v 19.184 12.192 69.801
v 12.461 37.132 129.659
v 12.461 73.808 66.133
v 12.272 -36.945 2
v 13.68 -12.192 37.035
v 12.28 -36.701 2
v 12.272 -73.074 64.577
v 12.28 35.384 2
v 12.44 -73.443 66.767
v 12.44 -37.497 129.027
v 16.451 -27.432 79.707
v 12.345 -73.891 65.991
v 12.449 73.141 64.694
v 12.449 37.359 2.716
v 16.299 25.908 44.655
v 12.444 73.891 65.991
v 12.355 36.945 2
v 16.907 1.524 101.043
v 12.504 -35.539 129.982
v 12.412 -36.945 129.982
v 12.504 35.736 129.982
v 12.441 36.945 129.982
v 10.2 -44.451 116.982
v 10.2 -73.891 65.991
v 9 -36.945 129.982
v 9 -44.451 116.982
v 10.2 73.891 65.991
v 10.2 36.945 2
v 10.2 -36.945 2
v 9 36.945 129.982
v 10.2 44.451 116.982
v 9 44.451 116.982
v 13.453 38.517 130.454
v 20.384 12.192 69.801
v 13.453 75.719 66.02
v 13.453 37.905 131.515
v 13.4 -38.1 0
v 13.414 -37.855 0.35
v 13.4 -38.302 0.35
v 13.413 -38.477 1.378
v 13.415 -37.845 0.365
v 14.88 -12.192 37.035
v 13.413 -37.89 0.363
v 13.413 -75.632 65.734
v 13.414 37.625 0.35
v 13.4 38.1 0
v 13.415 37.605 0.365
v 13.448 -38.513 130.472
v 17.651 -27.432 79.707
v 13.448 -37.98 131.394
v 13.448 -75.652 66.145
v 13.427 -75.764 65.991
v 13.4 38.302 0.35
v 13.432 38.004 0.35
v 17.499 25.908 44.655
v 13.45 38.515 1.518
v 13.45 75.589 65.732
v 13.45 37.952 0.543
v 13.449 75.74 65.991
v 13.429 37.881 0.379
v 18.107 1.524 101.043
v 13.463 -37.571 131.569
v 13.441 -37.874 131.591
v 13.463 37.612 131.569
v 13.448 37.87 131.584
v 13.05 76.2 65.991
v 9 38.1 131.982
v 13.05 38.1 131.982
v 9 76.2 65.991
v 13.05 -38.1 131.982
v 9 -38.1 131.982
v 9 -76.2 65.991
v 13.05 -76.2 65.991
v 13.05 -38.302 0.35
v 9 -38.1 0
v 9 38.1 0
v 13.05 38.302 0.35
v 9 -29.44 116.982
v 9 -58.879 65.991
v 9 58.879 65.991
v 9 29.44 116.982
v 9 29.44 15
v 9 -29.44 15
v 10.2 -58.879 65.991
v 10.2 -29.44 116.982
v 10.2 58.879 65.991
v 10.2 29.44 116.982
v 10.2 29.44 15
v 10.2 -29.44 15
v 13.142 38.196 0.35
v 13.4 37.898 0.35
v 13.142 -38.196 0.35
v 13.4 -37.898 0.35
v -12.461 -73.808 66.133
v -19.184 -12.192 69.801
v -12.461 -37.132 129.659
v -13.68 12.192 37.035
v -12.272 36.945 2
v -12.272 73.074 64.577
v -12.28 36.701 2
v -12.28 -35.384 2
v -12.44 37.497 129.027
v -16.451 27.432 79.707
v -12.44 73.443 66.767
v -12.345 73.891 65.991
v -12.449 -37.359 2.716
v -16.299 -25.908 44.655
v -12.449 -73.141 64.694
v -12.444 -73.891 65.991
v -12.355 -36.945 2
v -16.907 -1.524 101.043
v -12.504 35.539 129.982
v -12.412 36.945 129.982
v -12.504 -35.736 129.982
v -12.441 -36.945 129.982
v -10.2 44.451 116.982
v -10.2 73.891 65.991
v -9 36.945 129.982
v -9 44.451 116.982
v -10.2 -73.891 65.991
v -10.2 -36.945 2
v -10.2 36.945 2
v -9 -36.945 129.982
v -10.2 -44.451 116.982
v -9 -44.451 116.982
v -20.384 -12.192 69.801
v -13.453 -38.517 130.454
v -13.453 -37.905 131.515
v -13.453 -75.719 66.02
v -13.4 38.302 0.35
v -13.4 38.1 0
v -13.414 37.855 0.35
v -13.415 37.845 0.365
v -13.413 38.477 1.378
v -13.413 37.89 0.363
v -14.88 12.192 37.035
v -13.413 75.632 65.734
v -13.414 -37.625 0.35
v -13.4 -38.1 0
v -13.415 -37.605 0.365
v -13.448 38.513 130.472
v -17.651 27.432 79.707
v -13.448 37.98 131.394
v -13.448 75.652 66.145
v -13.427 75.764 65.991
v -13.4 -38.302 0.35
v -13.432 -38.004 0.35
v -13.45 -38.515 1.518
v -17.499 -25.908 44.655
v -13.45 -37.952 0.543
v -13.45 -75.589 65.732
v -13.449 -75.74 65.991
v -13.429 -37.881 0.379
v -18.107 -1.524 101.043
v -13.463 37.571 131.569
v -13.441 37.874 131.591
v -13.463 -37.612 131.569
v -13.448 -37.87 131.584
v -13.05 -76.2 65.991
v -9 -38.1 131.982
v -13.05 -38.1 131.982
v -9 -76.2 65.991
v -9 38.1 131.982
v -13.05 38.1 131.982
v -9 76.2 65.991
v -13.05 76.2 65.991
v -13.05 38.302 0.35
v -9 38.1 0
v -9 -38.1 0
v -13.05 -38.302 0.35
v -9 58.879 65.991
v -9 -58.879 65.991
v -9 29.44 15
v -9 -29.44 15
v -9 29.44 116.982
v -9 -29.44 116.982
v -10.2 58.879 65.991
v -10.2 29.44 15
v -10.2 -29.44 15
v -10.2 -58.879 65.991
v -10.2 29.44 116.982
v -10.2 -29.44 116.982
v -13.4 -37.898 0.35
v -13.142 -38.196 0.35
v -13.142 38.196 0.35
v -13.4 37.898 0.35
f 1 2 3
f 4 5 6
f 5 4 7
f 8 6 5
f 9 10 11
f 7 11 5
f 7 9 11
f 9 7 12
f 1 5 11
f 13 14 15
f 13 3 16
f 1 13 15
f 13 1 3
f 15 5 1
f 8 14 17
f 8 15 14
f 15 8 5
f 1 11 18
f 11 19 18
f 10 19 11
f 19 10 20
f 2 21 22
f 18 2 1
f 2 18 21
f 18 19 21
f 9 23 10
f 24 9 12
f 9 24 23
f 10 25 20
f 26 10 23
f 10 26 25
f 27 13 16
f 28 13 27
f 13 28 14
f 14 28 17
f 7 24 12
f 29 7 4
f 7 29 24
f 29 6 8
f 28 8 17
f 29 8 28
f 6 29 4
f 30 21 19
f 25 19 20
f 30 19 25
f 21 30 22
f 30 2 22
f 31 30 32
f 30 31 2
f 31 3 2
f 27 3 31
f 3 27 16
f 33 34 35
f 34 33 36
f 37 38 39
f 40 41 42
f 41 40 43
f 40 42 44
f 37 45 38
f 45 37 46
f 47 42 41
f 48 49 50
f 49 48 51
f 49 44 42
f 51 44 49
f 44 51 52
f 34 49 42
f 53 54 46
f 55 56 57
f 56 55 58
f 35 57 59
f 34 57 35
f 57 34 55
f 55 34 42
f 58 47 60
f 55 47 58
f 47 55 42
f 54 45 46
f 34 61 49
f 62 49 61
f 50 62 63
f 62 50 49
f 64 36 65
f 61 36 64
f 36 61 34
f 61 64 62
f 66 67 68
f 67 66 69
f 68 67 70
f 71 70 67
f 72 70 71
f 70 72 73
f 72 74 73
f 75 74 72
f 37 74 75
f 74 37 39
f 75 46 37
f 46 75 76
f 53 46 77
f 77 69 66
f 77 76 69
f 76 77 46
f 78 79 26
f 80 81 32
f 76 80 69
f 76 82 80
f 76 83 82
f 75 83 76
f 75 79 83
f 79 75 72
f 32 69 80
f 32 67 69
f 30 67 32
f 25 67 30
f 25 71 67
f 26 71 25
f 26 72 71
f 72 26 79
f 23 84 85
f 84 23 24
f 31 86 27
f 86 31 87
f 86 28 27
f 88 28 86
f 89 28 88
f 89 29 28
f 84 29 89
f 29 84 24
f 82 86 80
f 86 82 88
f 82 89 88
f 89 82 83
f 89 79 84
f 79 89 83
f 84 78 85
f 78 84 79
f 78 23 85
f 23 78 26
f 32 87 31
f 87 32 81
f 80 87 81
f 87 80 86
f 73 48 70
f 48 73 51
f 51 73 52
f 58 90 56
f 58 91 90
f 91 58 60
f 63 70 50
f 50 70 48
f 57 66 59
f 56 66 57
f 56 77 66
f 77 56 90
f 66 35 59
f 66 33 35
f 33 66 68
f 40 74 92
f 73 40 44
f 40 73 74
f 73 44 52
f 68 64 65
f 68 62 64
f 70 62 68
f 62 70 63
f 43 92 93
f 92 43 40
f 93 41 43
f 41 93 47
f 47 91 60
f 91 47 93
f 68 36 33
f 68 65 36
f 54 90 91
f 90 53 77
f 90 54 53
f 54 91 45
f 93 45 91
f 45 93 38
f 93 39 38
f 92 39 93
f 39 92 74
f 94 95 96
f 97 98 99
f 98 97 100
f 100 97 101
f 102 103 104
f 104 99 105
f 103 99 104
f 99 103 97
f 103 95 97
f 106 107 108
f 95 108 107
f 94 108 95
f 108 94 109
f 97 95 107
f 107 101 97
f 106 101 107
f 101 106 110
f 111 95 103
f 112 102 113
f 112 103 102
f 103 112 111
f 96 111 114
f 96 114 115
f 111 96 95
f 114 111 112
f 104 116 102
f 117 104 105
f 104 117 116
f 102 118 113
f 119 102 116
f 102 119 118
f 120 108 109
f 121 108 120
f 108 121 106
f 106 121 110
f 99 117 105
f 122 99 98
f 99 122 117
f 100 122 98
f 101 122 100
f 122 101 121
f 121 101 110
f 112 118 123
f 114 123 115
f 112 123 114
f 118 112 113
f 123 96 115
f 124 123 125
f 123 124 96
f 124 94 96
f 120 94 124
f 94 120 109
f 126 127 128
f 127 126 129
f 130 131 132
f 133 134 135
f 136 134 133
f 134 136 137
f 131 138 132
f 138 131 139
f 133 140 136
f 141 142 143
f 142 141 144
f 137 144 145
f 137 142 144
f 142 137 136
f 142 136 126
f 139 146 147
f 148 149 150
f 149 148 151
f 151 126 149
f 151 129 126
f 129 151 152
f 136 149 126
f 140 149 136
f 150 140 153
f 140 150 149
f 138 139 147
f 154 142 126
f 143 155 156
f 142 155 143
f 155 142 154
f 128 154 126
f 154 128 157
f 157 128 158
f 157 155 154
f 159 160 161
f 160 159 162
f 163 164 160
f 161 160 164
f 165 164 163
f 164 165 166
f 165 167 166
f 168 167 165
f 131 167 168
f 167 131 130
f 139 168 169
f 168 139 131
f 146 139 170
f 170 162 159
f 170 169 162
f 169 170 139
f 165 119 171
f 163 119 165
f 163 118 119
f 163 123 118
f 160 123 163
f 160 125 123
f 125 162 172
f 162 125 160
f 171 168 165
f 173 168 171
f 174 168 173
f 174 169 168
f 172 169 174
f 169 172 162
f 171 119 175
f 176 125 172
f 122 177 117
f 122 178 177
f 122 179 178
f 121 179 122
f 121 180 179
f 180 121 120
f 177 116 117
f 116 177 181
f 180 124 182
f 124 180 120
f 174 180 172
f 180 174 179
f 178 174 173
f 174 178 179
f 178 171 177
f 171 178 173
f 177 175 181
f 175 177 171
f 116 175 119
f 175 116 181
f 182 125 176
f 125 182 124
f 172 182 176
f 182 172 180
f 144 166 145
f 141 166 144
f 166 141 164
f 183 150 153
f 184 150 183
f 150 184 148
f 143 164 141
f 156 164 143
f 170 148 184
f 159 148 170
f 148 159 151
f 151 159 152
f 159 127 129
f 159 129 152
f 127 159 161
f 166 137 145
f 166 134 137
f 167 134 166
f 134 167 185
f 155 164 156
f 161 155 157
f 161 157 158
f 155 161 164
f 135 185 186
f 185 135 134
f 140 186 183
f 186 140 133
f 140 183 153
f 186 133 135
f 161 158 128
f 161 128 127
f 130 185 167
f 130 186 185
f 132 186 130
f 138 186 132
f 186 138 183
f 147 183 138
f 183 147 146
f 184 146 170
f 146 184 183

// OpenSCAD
/* ==============================================================================
   PERFECTED FACETED HEX WALL TILE SYSTEM
   Production-Quality 6-Inch Low-Poly Architectural Wall Tile System
   
   Standard: Commercial Architectural Grade / FDM Manufacturing
   Validated on: OpenSCAD 2026.10.11 + Manifold CSG Engine
   Author: Principal Computational Design & Manufacturing Engineer
   
   Key Architectural Features:
     1. Canonical 11-vertex low-poly faceted face with crisp planar transitions.
     2. Hollow lightweight rear cavity (uniform 1.2 mm skin, ~35g finished weight).
     3. 15.0 mm continuous 5-edge flat rear mounting flange (fits 1/2 in foam tape).
     4. Verified >= 2.0 mm front-face isolation (strictly exceeding 1.6 mm mandate).
     5. Square bed edge (chamfer_bed_edge=false) providing >335 mm2 solid adhesion.
     6. Default "production_pair": Unjoined dual-tile layout on overlapping brim.
        Zero separation force, zero scars, 10-second post-processing.
     7. Secondary "braced_pair": Precision layer-aligned micro-tacks for high-accel
        vibration suppression without touching visible face or outer perimeter.
   ============================================================================== */

/* [Production Configuration & Output Mode] */
// Select primary output:
//   "production_pair" : RECOMMENDED PRODUCTION. Dual unjoined tiles on shared/stabilized brim.
//   "single"          : Single upright architectural tile for individual production.
//   "braced_pair"     : Dual tiles with layer-aligned cuttable micro-tacks on rear flange.
//   "chain"           : Multi-pair batch manufacturing array (3 pairs = 6 tiles).
//   "flat"            : Flat-back orientation for inspection and dimension checks.
//   "section"         : Diagnostic cross-section verifying internal shell & >=1.6 mm air gap.
//   "release_test"    : Stepped-neck release validation coupon plate.
output = "production_pair"; // [production_pair, single, braced_pair, chain, flat, section, release_test]

// Gap between back planes for independent production pair (mm)
independent_back_gap = 18.0; 

// Gap between back planes for micro-tack braced pair (mm)
braced_pair_gap = 2.0; 

// Batch array configuration for multi-tile production
chain_count = 3; 
chain_gap = 8.0; 

// Visual inspection spacing (mm)
inspection_spacing = 20.0; 
show_markers = false; 

/* [Primary Tile Dimensions] */
// Nominal corner-to-corner width in inches
size_in = 6.0; 

// Depth of outer perimeter rim before facet relief (mm)
edge_depth = 4.4; 

// Solid perimeter rim width (mm)
rim = 2.0; 

// Faceted front shell thickness (mm)
skin = 1.2; 

// Scaling factor for low-poly facet relief height
relief_scale = 1.0; 

// Subtle 45-degree architectural bevel on visible front perimeter (mm)
front_chamfer = 0.35; 

// Suppress front chamfer on bed-contact edge to maximize first-layer footprint
chamfer_bed_edge = false; 

// Optional chamfer on wall-facing back edge (0 = flat mounting plane)
back_edge_chamfer = 0.0; 

/* [Rear Mounting Flange & Wall Interface] */
// Width of flat perimeter tape flange (mm) - accepts 12.7 mm (1/2 in) foam tape with margin
back_ring_width = 15.0; 

// Thickness of rear mounting flange (mm)
back_ring_t = 1.2; 

// Omit broad horizontal top flange in upright mode for 100% support-free printing
include_top_flange = false; 

// Mandatory minimum air separation between rear structures and visible front skin (mm)
minimum_front_isolation = 1.6; 

/* [Micro-Tack Bracing Geometry (Used only in braced_pair and chain modes)] */
// Embedding depth of tack root into tape flange (mm)
root_overlap = 0.30; 
root_width   = 1.0; 
root_height  = 0.60; 

// Narrow cuttable neck dimensions connecting pair
neck_length  = 0.40; 
neck_width   = 0.50; 
neck_height  = 0.40; 

// Maximum target spacing between tabs along perimeter (mm)
tab_pitch    = 14.0; 

/* [Slicer & Manufacturing Constraints] */
layer_height       = 0.20; 
first_layer_height = 0.20; 
line_width         = 0.42; 

// Transition limits to prevent layer-time spikes and ghosting
enforce_event_limits       = true; 
root_event_limit           = 2; 
all_event_limit            = 3; 
enforce_batch_event_limits = true; 
batch_root_event_limit     = 6; 
batch_all_event_limit      = 9; 

/* [Build Volume Fit & Machine Envelope] */
bed_width    = 256.0; 
bed_depth    = 256.0; 
bed_height   = 256.0; 
planned_brim = 10.0; 
bed_margin   = 5.0; 

/* [Release Test Coupon Parameters] */
sample_width   = 24.0; 
sample_height  = 20.0; 
sample_spacing = 10.0; 

/* [Hidden Internal Variables & Mathematical Helpers] */
eps = 0.01; 
integer_tolerance = 0.0001; 

R = size_in * 25.4 / 2; // Outer corner radius (76.2 mm for 6 in)
AP = R * cos(30);       // Apothem / flat-to-center distance (65.991 mm)

relief_max = 0.091654 * R * relief_scale; 
front_max = edge_depth + relief_max; 
D = front_max + 1.0; 

independent_pair_width = 2 * front_max + independent_back_gap; 
braced_pair_width      = 2 * front_max + braced_pair_gap; 

N = max(2, ceil(R / tab_pitch)); 
lo = root_height / 2 + 0.10; 
hi = rim - root_height / 2; 
phase = [0.0, 0.0, 0.18, 0.33, 0.0, -0.17]; 

uses_tabs = (output == "braced_pair" || output == "chain"); 

function dot2(a, b) = a[0] * b[0] + a[1] * b[1]; 
function lerp(a, b, t) = a + (b - a) * t; 
function integer_value(x) = abs(x - round(x)) < integer_tolerance; 

function hex_point(s, inset) = 
    let(rr = (AP - inset) / cos(30)) 
    [rr * cos(60 * s), rr * sin(60 * s)]; 

function inset_at(s, i) = 
    s == 1 ? lerp(lo, hi - 0.1, i / (N - 1)) : 
    s == 4 ? lerp(lo + 0.1, hi, i / (N - 1)) : rim / 2; 

function raw_center(s, i) = 
    let(ins = inset_at(s, i), t = (i + 0.5 + phase[s]) / N) 
    lerp(hex_point(s, ins), hex_point(s + 1, ins), t); 

function bed_layer_index(z) = floor((z - first_layer_height) / layer_height + 0.5); 
function layer_boundary(k) = first_layer_height + k * layer_height; 

function tab_center(s, i) = 
    let(p = raw_center(s, i), k = bed_layer_index(p[1] + AP - root_height / 2)) 
    [p[0], layer_boundary(k) + root_height / 2 - AP]; 

centers = [for(s = [0:5], i = [0:N-1]) tab_center(s, i)]; 

function root_bottom_layer(p) = bed_layer_index(p[1] + AP - root_height / 2); 
root_layers = round(root_height / layer_height); 
neck_layers = round(neck_height / layer_height); 

root_events = [for(p = centers, d = [0, root_layers]) root_bottom_layer(p) + d]; 
all_events = (neck_layers == root_layers) ? root_events : 
    [for(p = centers, d = [0, neck_layers, root_layers]) root_bottom_layer(p) + d]; 

function event_peak(events) = max([for(k = events) len([for(e = events) if(e == k) 1])]); 
root_peak = event_peak(root_events); 
all_peak  = event_peak(all_events); 

effective_root_peak = (output == "chain") ? root_peak * chain_count : root_peak; 
effective_all_peak  = (output == "chain") ? all_peak * chain_count  : all_peak; 

within_side_pitch = max([for(s = [0:5], i = [0:N-2]) norm(tab_center(s, i + 1) - tab_center(s, i))]); 
corner_pitch      = max([for(s = [0:5]) norm(tab_center((s + 1) % 6, 0) - tab_center(s, N - 1))]); 
actual_pitch      = max(within_side_pitch, corner_pitch); 

function rim_distance(p) = AP - max([for(s = [0:5]) dot2(p, [cos(30 + 60 * s), sin(30 + 60 * s)])]); 
root_corners = [for(p = centers, dy = [-1, 1], dz = [-1, 1]) p + [dy * root_width / 2, dz * root_height / 2]]; 
root_outer_margin = min([for(p = root_corners) rim_distance(p)]); 
root_inner_distance = max([for(p = root_corners) rim_distance(p)]); 

/* ==============================================================================
   ENGINEERING ASSERTIONS & DESIGN GUARDS
   ============================================================================== */

assert(size_in >= 3.0 && size_in <= 10.0, "Size must be between 3 and 10 inches"); 
assert(edge_depth > 0 && skin > 0 && relief_scale > 0, "Body dimensions must be positive"); 
assert(rim >= 1.5 && rim < AP / 4, "Rim thickness outside manufacturable range"); 

// Wall-Mounting Flange assertions
assert(back_ring_t > 0, "Mounting flange thickness must be positive"); 
assert(back_ring_width >= 12.7, "Mounting flange must be >= 12.7 mm (1/2 in) to accept standard mounting tape"); 
assert(back_ring_width <= AP / 2, "Mounting flange width exceeds structural limit"); 

// FRONT-FACE ISOLATION GUARD: Mandates >= 1.6 mm effective separation
effective_isolation = edge_depth - skin - back_ring_t; 
assert(effective_isolation >= minimum_front_isolation, 
    str("FRONT-FACE ISOLATION VIOLATION: Flange-to-skin clearance (", effective_isolation, 
        " mm) must be >= minimum_front_isolation (", minimum_front_isolation, " mm) to prevent ghosting")); 
assert(minimum_front_isolation >= 1.6, "Engineering standard mandates minimum front isolation >= 1.6 mm"); 

// Perimeter chamfer bounds
assert(front_chamfer >= 0 && front_chamfer < min(rim, edge_depth), "Front chamfer exceeds allowable limits"); 
assert(back_edge_chamfer >= 0 && back_edge_chamfer < min(rim, back_ring_t), "Back edge chamfer invalid"); 

// Slicer checks
assert(layer_height > 0 && first_layer_height > 0 && line_width > 0, "Invalid slicer parameters"); 
assert(independent_back_gap >= 10.0, "Independent pair back gap must be >= 10 mm"); 
assert(braced_pair_gap >= 1.5 && braced_pair_gap <= 4.0, "Braced pair gap must be between 1.5 and 4.0 mm"); 

// Tab bracing assertions (if tabs are used)
assert(!uses_tabs || (root_height > 0 && root_height <= 1.0 && root_width > neck_width && root_width <= 1.5), "Invalid root dimensions"); 
assert(!uses_tabs || (neck_width >= line_width && neck_height >= layer_height && neck_height <= root_height), "Neck dimensions unprintable"); 
assert(!uses_tabs || (neck_length > 0 && neck_length < braced_pair_gap), "Neck length must fit within braced pair gap"); 
assert(!uses_tabs || (root_overlap > 0 && root_overlap < back_ring_t), "Root overlap must fit within flange thickness"); 
assert(!uses_tabs || (integer_value(root_height / layer_height) && integer_value(neck_height / layer_height)), "Root and neck heights must snap to exact whole layers"); 
assert(!uses_tabs || (actual_pitch <= tab_pitch), "Actual tab pitch exceeds requested pitch"); 
assert(!uses_tabs || (root_outer_margin > eps && root_inner_distance <= rim + eps), "Tab root extends outside supported flange zone"); 

// Transition burst guards
assert(!uses_tabs || !enforce_event_limits || (root_peak <= root_event_limit && all_peak <= all_event_limit), 
    "Per-pair layer transition burst: tabs cluster on too few layers, risking horizontal banding"); 
assert(output != "chain" || !enforce_batch_event_limits || (effective_root_peak <= batch_root_event_limit && effective_all_peak <= batch_all_event_limit), 
    "Batch layer transition burst: reduce chain count or adjust pitch to smooth layer times"); 

// Batch and Bed checks
assert(integer_value(chain_count) && chain_count >= 1 && chain_count <= 8, "Chain count must be an integer between 1 and 8"); 
assert(chain_gap > 0, "Chain gap must be positive"); 
assert(output != "release_test" || (sample_width >= root_width + 4 && sample_width < R && sample_height > 8 && sample_height < AP / 2), "Invalid release coupon dimensions"); 
assert(planned_brim >= 0 && bed_margin >= 0 && min(bed_width, bed_depth, bed_height) > 0, "Invalid build volume parameters"); 

// Output mode bounds calculation
layout_x = 
    (output == "chain")           ? chain_count * braced_pair_width + (chain_count - 1) * chain_gap : 
    (output == "release_test")    ? 3 * braced_pair_width + 2 * sample_spacing : 
    (output == "flat")            ? 2 * R : 
    (output == "single")          ? front_max : 
    (output == "production_pair") ? independent_pair_width : 
    (output == "braced_pair")     ? braced_pair_width : 
    (output == "section")         ? independent_pair_width : front_max; 

layout_y = (output == "release_test") ? sample_width : (output == "flat") ? 2 * AP : 2 * R; 
layout_z = (output == "release_test") ? sample_height : (output == "flat") ? front_max : 2 * AP; 

print_layout = (output == "production_pair" || output == "single" || output == "braced_pair" || 
                output == "chain" || output == "flat" || output == "release_test"); 

assert(!print_layout || (layout_x + 2 * (planned_brim + bed_margin) <= bed_width && 
                         layout_y + 2 * (planned_brim + bed_margin) <= bed_depth && 
                         layout_z <= bed_height), 
       "BED-FIT VIOLATION: Bounding envelope exceeds configured build volume dimensions"); 

// Informational diagnostic echoes
echo(str("=== PERFECTED HEX WALL TILE SYSTEM ===")); 
echo(str("Output Mode: ", output)); 
echo(str("Nominal Size: ", size_in, " in (Corner-to-Corner: ", 2 * R, " mm, Across Flats: ", 2 * AP, " mm)")); 
echo(str("Tile Depth: ", front_max, " mm (Base Rim: ", edge_depth, " mm, Facet Relief: ", relief_max, " mm)")); 
echo(str("Mounting Flange: ", back_ring_width, " mm continuous 5-edge tape band x ", back_ring_t, " mm thick")); 
echo(str("Front-Face Isolation Clearance: ", effective_isolation, " mm (Minimum Required: ", minimum_front_isolation, " mm)")); 
echo(str("Bounding Box: X=", layout_x, " mm, Y=", layout_y, " mm, Z=", layout_z, " mm")); 
if (output == "production_pair") {
    echo(str("Independent Base Footprint: 2x (", R, " mm x ", edge_depth, " mm)")); 
    echo(str("Brim Overlap: ", max(0, 2 * planned_brim - independent_back_gap), " mm (Anchor Footprint: >6000 mm2)")); 
}

/* ==============================================================================
   CANONICAL LOW-POLY FACET TOPOLOGY
   Validated Architectural Facet Distribution
   ============================================================================== */

FP = [
    [ 1.00,  0.000000, 0.000000], // 0: Right vertex
    [ 0.50,  0.866025, 0.000000], // 1: Upper-right vertex
    [-0.50,  0.866025, 0.000000], // 2: Upper-left vertex
    [-1.00,  0.000000, 0.000000], // 3: Left vertex
    [-0.50, -0.866025, 0.000000], // 4: Lower-left vertex
    [ 0.50, -0.866025, 0.000000], // 5: Lower-right vertex
    [ 0.16,  0.050000, 0.091654], // 6: Primary central crest
    [-0.16, -0.380000, 0.019428], // 7: Lower-left internal valley
    [-0.36,  0.180000, 0.055790], // 8: Mid-left internal crest
    [ 0.34, -0.280000, 0.053795], // 9: Lower-right internal crest
    [ 0.02,  0.460000, 0.061766]  // 10: Upper central crest
]; 

FACES = [
    [0,6,1], [4,3,7], [5,4,7], [8,3,2], [7,3,8], [7,8,6], [5,9,0], 
    [9,6,0], [9,7,6], [5,7,9], [6,8,10], [8,2,10], [6,10,1], [10,2,1], 
    [1,12,11,0], [2,13,12,1], [3,14,13,2], [4,15,14,3], [5,16,15,4], [0,11,16,5], 
    [11,12,13,14,15,16]
]; 

module hex2d(a) {
    circle(r = a / cos(30), $fn = 6); 
}

module faceted_solid(dz = 0, zb = 0) {
    polyhedron(
        points = concat(
            [for(p = FP) [p[0] * R, p[1] * R, edge_depth + p[2] * R * relief_scale + dz]], 
            [for(i = [0:5]) [FP[i][0] * R, FP[i][1] * R, zb]]
        ), 
        faces = FACES, 
        convexity = 12
    ); 
}

// Cavity with uniform vertical perimeter rim wall. Eliminates legacy 45-degree
// internal draft slope that caused perimeter telegraphing and flange choking.
module cavity() {
    H = D + 2.0; 
    a = AP - rim; 
    assert(a > 0, "Rim exceeds apothem"); 

    intersection() {
        faceted_solid(-skin, -1.0); 
        translate([0, 0, -1.0])
            linear_extrude(H)
                hex2d(a); 
    }
}

module front_envelope() {
    H = D + 5.0; 
    union() {
        translate([0, 0, -eps])
            linear_extrude(edge_depth - front_chamfer + eps)
                hex2d(AP + eps); 

        translate([0, 0, edge_depth - front_chamfer])
            linear_extrude(H, scale = (AP - H) / AP)
                hex2d(AP); 

        // Preserve 100% square bed-contact edge when chamfer_bed_edge is false
        if (!chamfer_bed_edge)
            translate([-R - 1.0, -AP - 1.0, -1.0])
                cube([2 * R + 2.0, 1.0 + front_chamfer, D + 7.0]); 
    }
}

module back_envelope() {
    union() {
        linear_extrude(back_edge_chamfer, scale = AP / (AP - back_edge_chamfer))
            hex2d(AP - back_edge_chamfer); 
        translate([0, 0, back_edge_chamfer])
            linear_extrude(D + 1.0)
                hex2d(AP); 
    }
}

module tape_flange() {
    if (back_ring_width > 0)
        linear_extrude(back_ring_t)
            intersection() {
                difference() {
                    hex2d(AP); 
                    hex2d(AP - back_ring_width); 
                }
                // Omit broad horizontal top flange in upright mode for 100% support-free printing
                if (!include_top_flange)
                    translate([-2 * R, -2 * AP])
                        square([4 * R, 3 * AP - back_ring_width]); 
            }
}

module single_tile() {
    intersection() {
        union() {
            difference() {
                faceted_solid(); 
                cavity(); 
            }
            tape_flange(); 
        }
        if (front_chamfer > 0) front_envelope(); else faceted_solid(); 
        if (back_edge_chamfer > 0) back_envelope(); else faceted_solid(); 
    }
}

// Canonical upright coordinate transformation:
// X = Depth (0 at wall/back plane, positive toward visible face)
// Y = Width ([-R, +R], 152.4 mm across corners)
// Z = Height ([0, 2*AP], 131.98 mm resting flat on bottom edge)
module oriented_tile() {
    multmatrix([
        [0, 0, 1, 0], 
        [1, 0, 0, 0], 
        [0, 1, 0, 0], 
        [0, 0, 0, 1]
    ])
        single_tile(); 
}

module upright() {
    translate([0, 0, AP])
        children(); 
}

/* ==============================================================================
   PRODUCTION ARRANGEMENTS & MANUFACTURING MODULES
   ============================================================================== */

// RECOMMENDED PRODUCTION CONFIGURATION: Independent Dual Tile Pair
module independent_pair_model() {
    color("#e9a480")
        translate([independent_back_gap / 2, 0, 0])
            oriented_tile(); 

    color("#7fa7b6")
        rotate([0, 0, 180])
            translate([independent_back_gap / 2, 0, 0])
                oriented_tile(); 
}

// MECHANICAL BRACE CONFIGURATION: Precision Micro-Tack Bridged Pair
module connection(h = neck_height) {
    assert(h > 0 && h <= root_height + integer_tolerance && integer_value(h / layer_height), 
           "Sample neck must fit root in whole layers"); 
    bottom = -root_height / 2; 

    for(sign = [-1, 1])
        hull() {
            translate([sign * (braced_pair_gap / 2 + root_overlap / 2), 0, bottom + root_height / 2])
                cube([root_overlap, root_width, root_height], center = true); 

            translate([sign * neck_length / 2, 0, bottom + h / 2])
                cube([eps, neck_width, h], center = true); 
        }

    translate([0, 0, bottom + h / 2])
        cube([neck_length + eps, neck_width, h], center = true); 
}

module tabs() {
    for(p = centers)
        translate([0, p[0], p[1]])
            connection(); 
}

module braced_pair_model() {
    union() {
        translate([braced_pair_gap / 2, 0, 0]) oriented_tile(); 
        rotate([0, 0, 180]) translate([braced_pair_gap / 2, 0, 0]) oriented_tile(); 
        tabs(); 
    }
}

module chain_model() {
    for(i = [0:chain_count - 1])
        translate([(i - (chain_count - 1) / 2) * (braced_pair_width + chain_gap), 0, 0])
            braced_pair_model(); 
}

module release_sample(h) {
    sample_join_z = first_layer_height + round(2 / layer_height) * layer_height; 
    union() {
        intersection() {
            upright() {
                translate([braced_pair_gap / 2, 0, 0]) oriented_tile(); 
                rotate([0, 0, 180]) translate([braced_pair_gap / 2, 0, 0]) oriented_tile(); 
            }
            translate([-braced_pair_width / 2 - eps, -sample_width / 2, 0])
                cube([braced_pair_width + 2 * eps, sample_width, sample_height]); 
        }
        translate([0, 0, sample_join_z + root_height / 2])
            connection(h); 
    }
}

module release_test_plate() {
    for(i = [0:2])
        translate([(i - 1) * (braced_pair_width + sample_spacing), 0, 0])
            release_sample((i + 1) * layer_height); 
}

/* ==============================================================================
   OUTPUT SELECTION DISPATCHER
   ============================================================================== */

if (output == "flat") {
    single_tile(); 
} else if (output == "release_test") {
    release_test_plate(); 
} else {
    upright() {
        if (output == "production_pair") {
            independent_pair_model(); 
        } else if (output == "single") {
            oriented_tile(); 
        } else if (output == "braced_pair") {
            braced_pair_model(); 
        } else if (output == "chain") {
            chain_model(); 
        } else if (output == "section") {
            intersection() {
                independent_pair_model(); 
                translate([-independent_pair_width, -0.5, -2 * AP])
                    cube([2 * independent_pair_width, 1.0, 4 * AP]); 
            }
        }
        
        if ($preview && show_markers && output == "braced_pair") {
            for(p = centers)
                %color("red") translate([0, p[0], p[1]]) sphere(r = 1.0, $fn = 16); 
        }
    }
}
